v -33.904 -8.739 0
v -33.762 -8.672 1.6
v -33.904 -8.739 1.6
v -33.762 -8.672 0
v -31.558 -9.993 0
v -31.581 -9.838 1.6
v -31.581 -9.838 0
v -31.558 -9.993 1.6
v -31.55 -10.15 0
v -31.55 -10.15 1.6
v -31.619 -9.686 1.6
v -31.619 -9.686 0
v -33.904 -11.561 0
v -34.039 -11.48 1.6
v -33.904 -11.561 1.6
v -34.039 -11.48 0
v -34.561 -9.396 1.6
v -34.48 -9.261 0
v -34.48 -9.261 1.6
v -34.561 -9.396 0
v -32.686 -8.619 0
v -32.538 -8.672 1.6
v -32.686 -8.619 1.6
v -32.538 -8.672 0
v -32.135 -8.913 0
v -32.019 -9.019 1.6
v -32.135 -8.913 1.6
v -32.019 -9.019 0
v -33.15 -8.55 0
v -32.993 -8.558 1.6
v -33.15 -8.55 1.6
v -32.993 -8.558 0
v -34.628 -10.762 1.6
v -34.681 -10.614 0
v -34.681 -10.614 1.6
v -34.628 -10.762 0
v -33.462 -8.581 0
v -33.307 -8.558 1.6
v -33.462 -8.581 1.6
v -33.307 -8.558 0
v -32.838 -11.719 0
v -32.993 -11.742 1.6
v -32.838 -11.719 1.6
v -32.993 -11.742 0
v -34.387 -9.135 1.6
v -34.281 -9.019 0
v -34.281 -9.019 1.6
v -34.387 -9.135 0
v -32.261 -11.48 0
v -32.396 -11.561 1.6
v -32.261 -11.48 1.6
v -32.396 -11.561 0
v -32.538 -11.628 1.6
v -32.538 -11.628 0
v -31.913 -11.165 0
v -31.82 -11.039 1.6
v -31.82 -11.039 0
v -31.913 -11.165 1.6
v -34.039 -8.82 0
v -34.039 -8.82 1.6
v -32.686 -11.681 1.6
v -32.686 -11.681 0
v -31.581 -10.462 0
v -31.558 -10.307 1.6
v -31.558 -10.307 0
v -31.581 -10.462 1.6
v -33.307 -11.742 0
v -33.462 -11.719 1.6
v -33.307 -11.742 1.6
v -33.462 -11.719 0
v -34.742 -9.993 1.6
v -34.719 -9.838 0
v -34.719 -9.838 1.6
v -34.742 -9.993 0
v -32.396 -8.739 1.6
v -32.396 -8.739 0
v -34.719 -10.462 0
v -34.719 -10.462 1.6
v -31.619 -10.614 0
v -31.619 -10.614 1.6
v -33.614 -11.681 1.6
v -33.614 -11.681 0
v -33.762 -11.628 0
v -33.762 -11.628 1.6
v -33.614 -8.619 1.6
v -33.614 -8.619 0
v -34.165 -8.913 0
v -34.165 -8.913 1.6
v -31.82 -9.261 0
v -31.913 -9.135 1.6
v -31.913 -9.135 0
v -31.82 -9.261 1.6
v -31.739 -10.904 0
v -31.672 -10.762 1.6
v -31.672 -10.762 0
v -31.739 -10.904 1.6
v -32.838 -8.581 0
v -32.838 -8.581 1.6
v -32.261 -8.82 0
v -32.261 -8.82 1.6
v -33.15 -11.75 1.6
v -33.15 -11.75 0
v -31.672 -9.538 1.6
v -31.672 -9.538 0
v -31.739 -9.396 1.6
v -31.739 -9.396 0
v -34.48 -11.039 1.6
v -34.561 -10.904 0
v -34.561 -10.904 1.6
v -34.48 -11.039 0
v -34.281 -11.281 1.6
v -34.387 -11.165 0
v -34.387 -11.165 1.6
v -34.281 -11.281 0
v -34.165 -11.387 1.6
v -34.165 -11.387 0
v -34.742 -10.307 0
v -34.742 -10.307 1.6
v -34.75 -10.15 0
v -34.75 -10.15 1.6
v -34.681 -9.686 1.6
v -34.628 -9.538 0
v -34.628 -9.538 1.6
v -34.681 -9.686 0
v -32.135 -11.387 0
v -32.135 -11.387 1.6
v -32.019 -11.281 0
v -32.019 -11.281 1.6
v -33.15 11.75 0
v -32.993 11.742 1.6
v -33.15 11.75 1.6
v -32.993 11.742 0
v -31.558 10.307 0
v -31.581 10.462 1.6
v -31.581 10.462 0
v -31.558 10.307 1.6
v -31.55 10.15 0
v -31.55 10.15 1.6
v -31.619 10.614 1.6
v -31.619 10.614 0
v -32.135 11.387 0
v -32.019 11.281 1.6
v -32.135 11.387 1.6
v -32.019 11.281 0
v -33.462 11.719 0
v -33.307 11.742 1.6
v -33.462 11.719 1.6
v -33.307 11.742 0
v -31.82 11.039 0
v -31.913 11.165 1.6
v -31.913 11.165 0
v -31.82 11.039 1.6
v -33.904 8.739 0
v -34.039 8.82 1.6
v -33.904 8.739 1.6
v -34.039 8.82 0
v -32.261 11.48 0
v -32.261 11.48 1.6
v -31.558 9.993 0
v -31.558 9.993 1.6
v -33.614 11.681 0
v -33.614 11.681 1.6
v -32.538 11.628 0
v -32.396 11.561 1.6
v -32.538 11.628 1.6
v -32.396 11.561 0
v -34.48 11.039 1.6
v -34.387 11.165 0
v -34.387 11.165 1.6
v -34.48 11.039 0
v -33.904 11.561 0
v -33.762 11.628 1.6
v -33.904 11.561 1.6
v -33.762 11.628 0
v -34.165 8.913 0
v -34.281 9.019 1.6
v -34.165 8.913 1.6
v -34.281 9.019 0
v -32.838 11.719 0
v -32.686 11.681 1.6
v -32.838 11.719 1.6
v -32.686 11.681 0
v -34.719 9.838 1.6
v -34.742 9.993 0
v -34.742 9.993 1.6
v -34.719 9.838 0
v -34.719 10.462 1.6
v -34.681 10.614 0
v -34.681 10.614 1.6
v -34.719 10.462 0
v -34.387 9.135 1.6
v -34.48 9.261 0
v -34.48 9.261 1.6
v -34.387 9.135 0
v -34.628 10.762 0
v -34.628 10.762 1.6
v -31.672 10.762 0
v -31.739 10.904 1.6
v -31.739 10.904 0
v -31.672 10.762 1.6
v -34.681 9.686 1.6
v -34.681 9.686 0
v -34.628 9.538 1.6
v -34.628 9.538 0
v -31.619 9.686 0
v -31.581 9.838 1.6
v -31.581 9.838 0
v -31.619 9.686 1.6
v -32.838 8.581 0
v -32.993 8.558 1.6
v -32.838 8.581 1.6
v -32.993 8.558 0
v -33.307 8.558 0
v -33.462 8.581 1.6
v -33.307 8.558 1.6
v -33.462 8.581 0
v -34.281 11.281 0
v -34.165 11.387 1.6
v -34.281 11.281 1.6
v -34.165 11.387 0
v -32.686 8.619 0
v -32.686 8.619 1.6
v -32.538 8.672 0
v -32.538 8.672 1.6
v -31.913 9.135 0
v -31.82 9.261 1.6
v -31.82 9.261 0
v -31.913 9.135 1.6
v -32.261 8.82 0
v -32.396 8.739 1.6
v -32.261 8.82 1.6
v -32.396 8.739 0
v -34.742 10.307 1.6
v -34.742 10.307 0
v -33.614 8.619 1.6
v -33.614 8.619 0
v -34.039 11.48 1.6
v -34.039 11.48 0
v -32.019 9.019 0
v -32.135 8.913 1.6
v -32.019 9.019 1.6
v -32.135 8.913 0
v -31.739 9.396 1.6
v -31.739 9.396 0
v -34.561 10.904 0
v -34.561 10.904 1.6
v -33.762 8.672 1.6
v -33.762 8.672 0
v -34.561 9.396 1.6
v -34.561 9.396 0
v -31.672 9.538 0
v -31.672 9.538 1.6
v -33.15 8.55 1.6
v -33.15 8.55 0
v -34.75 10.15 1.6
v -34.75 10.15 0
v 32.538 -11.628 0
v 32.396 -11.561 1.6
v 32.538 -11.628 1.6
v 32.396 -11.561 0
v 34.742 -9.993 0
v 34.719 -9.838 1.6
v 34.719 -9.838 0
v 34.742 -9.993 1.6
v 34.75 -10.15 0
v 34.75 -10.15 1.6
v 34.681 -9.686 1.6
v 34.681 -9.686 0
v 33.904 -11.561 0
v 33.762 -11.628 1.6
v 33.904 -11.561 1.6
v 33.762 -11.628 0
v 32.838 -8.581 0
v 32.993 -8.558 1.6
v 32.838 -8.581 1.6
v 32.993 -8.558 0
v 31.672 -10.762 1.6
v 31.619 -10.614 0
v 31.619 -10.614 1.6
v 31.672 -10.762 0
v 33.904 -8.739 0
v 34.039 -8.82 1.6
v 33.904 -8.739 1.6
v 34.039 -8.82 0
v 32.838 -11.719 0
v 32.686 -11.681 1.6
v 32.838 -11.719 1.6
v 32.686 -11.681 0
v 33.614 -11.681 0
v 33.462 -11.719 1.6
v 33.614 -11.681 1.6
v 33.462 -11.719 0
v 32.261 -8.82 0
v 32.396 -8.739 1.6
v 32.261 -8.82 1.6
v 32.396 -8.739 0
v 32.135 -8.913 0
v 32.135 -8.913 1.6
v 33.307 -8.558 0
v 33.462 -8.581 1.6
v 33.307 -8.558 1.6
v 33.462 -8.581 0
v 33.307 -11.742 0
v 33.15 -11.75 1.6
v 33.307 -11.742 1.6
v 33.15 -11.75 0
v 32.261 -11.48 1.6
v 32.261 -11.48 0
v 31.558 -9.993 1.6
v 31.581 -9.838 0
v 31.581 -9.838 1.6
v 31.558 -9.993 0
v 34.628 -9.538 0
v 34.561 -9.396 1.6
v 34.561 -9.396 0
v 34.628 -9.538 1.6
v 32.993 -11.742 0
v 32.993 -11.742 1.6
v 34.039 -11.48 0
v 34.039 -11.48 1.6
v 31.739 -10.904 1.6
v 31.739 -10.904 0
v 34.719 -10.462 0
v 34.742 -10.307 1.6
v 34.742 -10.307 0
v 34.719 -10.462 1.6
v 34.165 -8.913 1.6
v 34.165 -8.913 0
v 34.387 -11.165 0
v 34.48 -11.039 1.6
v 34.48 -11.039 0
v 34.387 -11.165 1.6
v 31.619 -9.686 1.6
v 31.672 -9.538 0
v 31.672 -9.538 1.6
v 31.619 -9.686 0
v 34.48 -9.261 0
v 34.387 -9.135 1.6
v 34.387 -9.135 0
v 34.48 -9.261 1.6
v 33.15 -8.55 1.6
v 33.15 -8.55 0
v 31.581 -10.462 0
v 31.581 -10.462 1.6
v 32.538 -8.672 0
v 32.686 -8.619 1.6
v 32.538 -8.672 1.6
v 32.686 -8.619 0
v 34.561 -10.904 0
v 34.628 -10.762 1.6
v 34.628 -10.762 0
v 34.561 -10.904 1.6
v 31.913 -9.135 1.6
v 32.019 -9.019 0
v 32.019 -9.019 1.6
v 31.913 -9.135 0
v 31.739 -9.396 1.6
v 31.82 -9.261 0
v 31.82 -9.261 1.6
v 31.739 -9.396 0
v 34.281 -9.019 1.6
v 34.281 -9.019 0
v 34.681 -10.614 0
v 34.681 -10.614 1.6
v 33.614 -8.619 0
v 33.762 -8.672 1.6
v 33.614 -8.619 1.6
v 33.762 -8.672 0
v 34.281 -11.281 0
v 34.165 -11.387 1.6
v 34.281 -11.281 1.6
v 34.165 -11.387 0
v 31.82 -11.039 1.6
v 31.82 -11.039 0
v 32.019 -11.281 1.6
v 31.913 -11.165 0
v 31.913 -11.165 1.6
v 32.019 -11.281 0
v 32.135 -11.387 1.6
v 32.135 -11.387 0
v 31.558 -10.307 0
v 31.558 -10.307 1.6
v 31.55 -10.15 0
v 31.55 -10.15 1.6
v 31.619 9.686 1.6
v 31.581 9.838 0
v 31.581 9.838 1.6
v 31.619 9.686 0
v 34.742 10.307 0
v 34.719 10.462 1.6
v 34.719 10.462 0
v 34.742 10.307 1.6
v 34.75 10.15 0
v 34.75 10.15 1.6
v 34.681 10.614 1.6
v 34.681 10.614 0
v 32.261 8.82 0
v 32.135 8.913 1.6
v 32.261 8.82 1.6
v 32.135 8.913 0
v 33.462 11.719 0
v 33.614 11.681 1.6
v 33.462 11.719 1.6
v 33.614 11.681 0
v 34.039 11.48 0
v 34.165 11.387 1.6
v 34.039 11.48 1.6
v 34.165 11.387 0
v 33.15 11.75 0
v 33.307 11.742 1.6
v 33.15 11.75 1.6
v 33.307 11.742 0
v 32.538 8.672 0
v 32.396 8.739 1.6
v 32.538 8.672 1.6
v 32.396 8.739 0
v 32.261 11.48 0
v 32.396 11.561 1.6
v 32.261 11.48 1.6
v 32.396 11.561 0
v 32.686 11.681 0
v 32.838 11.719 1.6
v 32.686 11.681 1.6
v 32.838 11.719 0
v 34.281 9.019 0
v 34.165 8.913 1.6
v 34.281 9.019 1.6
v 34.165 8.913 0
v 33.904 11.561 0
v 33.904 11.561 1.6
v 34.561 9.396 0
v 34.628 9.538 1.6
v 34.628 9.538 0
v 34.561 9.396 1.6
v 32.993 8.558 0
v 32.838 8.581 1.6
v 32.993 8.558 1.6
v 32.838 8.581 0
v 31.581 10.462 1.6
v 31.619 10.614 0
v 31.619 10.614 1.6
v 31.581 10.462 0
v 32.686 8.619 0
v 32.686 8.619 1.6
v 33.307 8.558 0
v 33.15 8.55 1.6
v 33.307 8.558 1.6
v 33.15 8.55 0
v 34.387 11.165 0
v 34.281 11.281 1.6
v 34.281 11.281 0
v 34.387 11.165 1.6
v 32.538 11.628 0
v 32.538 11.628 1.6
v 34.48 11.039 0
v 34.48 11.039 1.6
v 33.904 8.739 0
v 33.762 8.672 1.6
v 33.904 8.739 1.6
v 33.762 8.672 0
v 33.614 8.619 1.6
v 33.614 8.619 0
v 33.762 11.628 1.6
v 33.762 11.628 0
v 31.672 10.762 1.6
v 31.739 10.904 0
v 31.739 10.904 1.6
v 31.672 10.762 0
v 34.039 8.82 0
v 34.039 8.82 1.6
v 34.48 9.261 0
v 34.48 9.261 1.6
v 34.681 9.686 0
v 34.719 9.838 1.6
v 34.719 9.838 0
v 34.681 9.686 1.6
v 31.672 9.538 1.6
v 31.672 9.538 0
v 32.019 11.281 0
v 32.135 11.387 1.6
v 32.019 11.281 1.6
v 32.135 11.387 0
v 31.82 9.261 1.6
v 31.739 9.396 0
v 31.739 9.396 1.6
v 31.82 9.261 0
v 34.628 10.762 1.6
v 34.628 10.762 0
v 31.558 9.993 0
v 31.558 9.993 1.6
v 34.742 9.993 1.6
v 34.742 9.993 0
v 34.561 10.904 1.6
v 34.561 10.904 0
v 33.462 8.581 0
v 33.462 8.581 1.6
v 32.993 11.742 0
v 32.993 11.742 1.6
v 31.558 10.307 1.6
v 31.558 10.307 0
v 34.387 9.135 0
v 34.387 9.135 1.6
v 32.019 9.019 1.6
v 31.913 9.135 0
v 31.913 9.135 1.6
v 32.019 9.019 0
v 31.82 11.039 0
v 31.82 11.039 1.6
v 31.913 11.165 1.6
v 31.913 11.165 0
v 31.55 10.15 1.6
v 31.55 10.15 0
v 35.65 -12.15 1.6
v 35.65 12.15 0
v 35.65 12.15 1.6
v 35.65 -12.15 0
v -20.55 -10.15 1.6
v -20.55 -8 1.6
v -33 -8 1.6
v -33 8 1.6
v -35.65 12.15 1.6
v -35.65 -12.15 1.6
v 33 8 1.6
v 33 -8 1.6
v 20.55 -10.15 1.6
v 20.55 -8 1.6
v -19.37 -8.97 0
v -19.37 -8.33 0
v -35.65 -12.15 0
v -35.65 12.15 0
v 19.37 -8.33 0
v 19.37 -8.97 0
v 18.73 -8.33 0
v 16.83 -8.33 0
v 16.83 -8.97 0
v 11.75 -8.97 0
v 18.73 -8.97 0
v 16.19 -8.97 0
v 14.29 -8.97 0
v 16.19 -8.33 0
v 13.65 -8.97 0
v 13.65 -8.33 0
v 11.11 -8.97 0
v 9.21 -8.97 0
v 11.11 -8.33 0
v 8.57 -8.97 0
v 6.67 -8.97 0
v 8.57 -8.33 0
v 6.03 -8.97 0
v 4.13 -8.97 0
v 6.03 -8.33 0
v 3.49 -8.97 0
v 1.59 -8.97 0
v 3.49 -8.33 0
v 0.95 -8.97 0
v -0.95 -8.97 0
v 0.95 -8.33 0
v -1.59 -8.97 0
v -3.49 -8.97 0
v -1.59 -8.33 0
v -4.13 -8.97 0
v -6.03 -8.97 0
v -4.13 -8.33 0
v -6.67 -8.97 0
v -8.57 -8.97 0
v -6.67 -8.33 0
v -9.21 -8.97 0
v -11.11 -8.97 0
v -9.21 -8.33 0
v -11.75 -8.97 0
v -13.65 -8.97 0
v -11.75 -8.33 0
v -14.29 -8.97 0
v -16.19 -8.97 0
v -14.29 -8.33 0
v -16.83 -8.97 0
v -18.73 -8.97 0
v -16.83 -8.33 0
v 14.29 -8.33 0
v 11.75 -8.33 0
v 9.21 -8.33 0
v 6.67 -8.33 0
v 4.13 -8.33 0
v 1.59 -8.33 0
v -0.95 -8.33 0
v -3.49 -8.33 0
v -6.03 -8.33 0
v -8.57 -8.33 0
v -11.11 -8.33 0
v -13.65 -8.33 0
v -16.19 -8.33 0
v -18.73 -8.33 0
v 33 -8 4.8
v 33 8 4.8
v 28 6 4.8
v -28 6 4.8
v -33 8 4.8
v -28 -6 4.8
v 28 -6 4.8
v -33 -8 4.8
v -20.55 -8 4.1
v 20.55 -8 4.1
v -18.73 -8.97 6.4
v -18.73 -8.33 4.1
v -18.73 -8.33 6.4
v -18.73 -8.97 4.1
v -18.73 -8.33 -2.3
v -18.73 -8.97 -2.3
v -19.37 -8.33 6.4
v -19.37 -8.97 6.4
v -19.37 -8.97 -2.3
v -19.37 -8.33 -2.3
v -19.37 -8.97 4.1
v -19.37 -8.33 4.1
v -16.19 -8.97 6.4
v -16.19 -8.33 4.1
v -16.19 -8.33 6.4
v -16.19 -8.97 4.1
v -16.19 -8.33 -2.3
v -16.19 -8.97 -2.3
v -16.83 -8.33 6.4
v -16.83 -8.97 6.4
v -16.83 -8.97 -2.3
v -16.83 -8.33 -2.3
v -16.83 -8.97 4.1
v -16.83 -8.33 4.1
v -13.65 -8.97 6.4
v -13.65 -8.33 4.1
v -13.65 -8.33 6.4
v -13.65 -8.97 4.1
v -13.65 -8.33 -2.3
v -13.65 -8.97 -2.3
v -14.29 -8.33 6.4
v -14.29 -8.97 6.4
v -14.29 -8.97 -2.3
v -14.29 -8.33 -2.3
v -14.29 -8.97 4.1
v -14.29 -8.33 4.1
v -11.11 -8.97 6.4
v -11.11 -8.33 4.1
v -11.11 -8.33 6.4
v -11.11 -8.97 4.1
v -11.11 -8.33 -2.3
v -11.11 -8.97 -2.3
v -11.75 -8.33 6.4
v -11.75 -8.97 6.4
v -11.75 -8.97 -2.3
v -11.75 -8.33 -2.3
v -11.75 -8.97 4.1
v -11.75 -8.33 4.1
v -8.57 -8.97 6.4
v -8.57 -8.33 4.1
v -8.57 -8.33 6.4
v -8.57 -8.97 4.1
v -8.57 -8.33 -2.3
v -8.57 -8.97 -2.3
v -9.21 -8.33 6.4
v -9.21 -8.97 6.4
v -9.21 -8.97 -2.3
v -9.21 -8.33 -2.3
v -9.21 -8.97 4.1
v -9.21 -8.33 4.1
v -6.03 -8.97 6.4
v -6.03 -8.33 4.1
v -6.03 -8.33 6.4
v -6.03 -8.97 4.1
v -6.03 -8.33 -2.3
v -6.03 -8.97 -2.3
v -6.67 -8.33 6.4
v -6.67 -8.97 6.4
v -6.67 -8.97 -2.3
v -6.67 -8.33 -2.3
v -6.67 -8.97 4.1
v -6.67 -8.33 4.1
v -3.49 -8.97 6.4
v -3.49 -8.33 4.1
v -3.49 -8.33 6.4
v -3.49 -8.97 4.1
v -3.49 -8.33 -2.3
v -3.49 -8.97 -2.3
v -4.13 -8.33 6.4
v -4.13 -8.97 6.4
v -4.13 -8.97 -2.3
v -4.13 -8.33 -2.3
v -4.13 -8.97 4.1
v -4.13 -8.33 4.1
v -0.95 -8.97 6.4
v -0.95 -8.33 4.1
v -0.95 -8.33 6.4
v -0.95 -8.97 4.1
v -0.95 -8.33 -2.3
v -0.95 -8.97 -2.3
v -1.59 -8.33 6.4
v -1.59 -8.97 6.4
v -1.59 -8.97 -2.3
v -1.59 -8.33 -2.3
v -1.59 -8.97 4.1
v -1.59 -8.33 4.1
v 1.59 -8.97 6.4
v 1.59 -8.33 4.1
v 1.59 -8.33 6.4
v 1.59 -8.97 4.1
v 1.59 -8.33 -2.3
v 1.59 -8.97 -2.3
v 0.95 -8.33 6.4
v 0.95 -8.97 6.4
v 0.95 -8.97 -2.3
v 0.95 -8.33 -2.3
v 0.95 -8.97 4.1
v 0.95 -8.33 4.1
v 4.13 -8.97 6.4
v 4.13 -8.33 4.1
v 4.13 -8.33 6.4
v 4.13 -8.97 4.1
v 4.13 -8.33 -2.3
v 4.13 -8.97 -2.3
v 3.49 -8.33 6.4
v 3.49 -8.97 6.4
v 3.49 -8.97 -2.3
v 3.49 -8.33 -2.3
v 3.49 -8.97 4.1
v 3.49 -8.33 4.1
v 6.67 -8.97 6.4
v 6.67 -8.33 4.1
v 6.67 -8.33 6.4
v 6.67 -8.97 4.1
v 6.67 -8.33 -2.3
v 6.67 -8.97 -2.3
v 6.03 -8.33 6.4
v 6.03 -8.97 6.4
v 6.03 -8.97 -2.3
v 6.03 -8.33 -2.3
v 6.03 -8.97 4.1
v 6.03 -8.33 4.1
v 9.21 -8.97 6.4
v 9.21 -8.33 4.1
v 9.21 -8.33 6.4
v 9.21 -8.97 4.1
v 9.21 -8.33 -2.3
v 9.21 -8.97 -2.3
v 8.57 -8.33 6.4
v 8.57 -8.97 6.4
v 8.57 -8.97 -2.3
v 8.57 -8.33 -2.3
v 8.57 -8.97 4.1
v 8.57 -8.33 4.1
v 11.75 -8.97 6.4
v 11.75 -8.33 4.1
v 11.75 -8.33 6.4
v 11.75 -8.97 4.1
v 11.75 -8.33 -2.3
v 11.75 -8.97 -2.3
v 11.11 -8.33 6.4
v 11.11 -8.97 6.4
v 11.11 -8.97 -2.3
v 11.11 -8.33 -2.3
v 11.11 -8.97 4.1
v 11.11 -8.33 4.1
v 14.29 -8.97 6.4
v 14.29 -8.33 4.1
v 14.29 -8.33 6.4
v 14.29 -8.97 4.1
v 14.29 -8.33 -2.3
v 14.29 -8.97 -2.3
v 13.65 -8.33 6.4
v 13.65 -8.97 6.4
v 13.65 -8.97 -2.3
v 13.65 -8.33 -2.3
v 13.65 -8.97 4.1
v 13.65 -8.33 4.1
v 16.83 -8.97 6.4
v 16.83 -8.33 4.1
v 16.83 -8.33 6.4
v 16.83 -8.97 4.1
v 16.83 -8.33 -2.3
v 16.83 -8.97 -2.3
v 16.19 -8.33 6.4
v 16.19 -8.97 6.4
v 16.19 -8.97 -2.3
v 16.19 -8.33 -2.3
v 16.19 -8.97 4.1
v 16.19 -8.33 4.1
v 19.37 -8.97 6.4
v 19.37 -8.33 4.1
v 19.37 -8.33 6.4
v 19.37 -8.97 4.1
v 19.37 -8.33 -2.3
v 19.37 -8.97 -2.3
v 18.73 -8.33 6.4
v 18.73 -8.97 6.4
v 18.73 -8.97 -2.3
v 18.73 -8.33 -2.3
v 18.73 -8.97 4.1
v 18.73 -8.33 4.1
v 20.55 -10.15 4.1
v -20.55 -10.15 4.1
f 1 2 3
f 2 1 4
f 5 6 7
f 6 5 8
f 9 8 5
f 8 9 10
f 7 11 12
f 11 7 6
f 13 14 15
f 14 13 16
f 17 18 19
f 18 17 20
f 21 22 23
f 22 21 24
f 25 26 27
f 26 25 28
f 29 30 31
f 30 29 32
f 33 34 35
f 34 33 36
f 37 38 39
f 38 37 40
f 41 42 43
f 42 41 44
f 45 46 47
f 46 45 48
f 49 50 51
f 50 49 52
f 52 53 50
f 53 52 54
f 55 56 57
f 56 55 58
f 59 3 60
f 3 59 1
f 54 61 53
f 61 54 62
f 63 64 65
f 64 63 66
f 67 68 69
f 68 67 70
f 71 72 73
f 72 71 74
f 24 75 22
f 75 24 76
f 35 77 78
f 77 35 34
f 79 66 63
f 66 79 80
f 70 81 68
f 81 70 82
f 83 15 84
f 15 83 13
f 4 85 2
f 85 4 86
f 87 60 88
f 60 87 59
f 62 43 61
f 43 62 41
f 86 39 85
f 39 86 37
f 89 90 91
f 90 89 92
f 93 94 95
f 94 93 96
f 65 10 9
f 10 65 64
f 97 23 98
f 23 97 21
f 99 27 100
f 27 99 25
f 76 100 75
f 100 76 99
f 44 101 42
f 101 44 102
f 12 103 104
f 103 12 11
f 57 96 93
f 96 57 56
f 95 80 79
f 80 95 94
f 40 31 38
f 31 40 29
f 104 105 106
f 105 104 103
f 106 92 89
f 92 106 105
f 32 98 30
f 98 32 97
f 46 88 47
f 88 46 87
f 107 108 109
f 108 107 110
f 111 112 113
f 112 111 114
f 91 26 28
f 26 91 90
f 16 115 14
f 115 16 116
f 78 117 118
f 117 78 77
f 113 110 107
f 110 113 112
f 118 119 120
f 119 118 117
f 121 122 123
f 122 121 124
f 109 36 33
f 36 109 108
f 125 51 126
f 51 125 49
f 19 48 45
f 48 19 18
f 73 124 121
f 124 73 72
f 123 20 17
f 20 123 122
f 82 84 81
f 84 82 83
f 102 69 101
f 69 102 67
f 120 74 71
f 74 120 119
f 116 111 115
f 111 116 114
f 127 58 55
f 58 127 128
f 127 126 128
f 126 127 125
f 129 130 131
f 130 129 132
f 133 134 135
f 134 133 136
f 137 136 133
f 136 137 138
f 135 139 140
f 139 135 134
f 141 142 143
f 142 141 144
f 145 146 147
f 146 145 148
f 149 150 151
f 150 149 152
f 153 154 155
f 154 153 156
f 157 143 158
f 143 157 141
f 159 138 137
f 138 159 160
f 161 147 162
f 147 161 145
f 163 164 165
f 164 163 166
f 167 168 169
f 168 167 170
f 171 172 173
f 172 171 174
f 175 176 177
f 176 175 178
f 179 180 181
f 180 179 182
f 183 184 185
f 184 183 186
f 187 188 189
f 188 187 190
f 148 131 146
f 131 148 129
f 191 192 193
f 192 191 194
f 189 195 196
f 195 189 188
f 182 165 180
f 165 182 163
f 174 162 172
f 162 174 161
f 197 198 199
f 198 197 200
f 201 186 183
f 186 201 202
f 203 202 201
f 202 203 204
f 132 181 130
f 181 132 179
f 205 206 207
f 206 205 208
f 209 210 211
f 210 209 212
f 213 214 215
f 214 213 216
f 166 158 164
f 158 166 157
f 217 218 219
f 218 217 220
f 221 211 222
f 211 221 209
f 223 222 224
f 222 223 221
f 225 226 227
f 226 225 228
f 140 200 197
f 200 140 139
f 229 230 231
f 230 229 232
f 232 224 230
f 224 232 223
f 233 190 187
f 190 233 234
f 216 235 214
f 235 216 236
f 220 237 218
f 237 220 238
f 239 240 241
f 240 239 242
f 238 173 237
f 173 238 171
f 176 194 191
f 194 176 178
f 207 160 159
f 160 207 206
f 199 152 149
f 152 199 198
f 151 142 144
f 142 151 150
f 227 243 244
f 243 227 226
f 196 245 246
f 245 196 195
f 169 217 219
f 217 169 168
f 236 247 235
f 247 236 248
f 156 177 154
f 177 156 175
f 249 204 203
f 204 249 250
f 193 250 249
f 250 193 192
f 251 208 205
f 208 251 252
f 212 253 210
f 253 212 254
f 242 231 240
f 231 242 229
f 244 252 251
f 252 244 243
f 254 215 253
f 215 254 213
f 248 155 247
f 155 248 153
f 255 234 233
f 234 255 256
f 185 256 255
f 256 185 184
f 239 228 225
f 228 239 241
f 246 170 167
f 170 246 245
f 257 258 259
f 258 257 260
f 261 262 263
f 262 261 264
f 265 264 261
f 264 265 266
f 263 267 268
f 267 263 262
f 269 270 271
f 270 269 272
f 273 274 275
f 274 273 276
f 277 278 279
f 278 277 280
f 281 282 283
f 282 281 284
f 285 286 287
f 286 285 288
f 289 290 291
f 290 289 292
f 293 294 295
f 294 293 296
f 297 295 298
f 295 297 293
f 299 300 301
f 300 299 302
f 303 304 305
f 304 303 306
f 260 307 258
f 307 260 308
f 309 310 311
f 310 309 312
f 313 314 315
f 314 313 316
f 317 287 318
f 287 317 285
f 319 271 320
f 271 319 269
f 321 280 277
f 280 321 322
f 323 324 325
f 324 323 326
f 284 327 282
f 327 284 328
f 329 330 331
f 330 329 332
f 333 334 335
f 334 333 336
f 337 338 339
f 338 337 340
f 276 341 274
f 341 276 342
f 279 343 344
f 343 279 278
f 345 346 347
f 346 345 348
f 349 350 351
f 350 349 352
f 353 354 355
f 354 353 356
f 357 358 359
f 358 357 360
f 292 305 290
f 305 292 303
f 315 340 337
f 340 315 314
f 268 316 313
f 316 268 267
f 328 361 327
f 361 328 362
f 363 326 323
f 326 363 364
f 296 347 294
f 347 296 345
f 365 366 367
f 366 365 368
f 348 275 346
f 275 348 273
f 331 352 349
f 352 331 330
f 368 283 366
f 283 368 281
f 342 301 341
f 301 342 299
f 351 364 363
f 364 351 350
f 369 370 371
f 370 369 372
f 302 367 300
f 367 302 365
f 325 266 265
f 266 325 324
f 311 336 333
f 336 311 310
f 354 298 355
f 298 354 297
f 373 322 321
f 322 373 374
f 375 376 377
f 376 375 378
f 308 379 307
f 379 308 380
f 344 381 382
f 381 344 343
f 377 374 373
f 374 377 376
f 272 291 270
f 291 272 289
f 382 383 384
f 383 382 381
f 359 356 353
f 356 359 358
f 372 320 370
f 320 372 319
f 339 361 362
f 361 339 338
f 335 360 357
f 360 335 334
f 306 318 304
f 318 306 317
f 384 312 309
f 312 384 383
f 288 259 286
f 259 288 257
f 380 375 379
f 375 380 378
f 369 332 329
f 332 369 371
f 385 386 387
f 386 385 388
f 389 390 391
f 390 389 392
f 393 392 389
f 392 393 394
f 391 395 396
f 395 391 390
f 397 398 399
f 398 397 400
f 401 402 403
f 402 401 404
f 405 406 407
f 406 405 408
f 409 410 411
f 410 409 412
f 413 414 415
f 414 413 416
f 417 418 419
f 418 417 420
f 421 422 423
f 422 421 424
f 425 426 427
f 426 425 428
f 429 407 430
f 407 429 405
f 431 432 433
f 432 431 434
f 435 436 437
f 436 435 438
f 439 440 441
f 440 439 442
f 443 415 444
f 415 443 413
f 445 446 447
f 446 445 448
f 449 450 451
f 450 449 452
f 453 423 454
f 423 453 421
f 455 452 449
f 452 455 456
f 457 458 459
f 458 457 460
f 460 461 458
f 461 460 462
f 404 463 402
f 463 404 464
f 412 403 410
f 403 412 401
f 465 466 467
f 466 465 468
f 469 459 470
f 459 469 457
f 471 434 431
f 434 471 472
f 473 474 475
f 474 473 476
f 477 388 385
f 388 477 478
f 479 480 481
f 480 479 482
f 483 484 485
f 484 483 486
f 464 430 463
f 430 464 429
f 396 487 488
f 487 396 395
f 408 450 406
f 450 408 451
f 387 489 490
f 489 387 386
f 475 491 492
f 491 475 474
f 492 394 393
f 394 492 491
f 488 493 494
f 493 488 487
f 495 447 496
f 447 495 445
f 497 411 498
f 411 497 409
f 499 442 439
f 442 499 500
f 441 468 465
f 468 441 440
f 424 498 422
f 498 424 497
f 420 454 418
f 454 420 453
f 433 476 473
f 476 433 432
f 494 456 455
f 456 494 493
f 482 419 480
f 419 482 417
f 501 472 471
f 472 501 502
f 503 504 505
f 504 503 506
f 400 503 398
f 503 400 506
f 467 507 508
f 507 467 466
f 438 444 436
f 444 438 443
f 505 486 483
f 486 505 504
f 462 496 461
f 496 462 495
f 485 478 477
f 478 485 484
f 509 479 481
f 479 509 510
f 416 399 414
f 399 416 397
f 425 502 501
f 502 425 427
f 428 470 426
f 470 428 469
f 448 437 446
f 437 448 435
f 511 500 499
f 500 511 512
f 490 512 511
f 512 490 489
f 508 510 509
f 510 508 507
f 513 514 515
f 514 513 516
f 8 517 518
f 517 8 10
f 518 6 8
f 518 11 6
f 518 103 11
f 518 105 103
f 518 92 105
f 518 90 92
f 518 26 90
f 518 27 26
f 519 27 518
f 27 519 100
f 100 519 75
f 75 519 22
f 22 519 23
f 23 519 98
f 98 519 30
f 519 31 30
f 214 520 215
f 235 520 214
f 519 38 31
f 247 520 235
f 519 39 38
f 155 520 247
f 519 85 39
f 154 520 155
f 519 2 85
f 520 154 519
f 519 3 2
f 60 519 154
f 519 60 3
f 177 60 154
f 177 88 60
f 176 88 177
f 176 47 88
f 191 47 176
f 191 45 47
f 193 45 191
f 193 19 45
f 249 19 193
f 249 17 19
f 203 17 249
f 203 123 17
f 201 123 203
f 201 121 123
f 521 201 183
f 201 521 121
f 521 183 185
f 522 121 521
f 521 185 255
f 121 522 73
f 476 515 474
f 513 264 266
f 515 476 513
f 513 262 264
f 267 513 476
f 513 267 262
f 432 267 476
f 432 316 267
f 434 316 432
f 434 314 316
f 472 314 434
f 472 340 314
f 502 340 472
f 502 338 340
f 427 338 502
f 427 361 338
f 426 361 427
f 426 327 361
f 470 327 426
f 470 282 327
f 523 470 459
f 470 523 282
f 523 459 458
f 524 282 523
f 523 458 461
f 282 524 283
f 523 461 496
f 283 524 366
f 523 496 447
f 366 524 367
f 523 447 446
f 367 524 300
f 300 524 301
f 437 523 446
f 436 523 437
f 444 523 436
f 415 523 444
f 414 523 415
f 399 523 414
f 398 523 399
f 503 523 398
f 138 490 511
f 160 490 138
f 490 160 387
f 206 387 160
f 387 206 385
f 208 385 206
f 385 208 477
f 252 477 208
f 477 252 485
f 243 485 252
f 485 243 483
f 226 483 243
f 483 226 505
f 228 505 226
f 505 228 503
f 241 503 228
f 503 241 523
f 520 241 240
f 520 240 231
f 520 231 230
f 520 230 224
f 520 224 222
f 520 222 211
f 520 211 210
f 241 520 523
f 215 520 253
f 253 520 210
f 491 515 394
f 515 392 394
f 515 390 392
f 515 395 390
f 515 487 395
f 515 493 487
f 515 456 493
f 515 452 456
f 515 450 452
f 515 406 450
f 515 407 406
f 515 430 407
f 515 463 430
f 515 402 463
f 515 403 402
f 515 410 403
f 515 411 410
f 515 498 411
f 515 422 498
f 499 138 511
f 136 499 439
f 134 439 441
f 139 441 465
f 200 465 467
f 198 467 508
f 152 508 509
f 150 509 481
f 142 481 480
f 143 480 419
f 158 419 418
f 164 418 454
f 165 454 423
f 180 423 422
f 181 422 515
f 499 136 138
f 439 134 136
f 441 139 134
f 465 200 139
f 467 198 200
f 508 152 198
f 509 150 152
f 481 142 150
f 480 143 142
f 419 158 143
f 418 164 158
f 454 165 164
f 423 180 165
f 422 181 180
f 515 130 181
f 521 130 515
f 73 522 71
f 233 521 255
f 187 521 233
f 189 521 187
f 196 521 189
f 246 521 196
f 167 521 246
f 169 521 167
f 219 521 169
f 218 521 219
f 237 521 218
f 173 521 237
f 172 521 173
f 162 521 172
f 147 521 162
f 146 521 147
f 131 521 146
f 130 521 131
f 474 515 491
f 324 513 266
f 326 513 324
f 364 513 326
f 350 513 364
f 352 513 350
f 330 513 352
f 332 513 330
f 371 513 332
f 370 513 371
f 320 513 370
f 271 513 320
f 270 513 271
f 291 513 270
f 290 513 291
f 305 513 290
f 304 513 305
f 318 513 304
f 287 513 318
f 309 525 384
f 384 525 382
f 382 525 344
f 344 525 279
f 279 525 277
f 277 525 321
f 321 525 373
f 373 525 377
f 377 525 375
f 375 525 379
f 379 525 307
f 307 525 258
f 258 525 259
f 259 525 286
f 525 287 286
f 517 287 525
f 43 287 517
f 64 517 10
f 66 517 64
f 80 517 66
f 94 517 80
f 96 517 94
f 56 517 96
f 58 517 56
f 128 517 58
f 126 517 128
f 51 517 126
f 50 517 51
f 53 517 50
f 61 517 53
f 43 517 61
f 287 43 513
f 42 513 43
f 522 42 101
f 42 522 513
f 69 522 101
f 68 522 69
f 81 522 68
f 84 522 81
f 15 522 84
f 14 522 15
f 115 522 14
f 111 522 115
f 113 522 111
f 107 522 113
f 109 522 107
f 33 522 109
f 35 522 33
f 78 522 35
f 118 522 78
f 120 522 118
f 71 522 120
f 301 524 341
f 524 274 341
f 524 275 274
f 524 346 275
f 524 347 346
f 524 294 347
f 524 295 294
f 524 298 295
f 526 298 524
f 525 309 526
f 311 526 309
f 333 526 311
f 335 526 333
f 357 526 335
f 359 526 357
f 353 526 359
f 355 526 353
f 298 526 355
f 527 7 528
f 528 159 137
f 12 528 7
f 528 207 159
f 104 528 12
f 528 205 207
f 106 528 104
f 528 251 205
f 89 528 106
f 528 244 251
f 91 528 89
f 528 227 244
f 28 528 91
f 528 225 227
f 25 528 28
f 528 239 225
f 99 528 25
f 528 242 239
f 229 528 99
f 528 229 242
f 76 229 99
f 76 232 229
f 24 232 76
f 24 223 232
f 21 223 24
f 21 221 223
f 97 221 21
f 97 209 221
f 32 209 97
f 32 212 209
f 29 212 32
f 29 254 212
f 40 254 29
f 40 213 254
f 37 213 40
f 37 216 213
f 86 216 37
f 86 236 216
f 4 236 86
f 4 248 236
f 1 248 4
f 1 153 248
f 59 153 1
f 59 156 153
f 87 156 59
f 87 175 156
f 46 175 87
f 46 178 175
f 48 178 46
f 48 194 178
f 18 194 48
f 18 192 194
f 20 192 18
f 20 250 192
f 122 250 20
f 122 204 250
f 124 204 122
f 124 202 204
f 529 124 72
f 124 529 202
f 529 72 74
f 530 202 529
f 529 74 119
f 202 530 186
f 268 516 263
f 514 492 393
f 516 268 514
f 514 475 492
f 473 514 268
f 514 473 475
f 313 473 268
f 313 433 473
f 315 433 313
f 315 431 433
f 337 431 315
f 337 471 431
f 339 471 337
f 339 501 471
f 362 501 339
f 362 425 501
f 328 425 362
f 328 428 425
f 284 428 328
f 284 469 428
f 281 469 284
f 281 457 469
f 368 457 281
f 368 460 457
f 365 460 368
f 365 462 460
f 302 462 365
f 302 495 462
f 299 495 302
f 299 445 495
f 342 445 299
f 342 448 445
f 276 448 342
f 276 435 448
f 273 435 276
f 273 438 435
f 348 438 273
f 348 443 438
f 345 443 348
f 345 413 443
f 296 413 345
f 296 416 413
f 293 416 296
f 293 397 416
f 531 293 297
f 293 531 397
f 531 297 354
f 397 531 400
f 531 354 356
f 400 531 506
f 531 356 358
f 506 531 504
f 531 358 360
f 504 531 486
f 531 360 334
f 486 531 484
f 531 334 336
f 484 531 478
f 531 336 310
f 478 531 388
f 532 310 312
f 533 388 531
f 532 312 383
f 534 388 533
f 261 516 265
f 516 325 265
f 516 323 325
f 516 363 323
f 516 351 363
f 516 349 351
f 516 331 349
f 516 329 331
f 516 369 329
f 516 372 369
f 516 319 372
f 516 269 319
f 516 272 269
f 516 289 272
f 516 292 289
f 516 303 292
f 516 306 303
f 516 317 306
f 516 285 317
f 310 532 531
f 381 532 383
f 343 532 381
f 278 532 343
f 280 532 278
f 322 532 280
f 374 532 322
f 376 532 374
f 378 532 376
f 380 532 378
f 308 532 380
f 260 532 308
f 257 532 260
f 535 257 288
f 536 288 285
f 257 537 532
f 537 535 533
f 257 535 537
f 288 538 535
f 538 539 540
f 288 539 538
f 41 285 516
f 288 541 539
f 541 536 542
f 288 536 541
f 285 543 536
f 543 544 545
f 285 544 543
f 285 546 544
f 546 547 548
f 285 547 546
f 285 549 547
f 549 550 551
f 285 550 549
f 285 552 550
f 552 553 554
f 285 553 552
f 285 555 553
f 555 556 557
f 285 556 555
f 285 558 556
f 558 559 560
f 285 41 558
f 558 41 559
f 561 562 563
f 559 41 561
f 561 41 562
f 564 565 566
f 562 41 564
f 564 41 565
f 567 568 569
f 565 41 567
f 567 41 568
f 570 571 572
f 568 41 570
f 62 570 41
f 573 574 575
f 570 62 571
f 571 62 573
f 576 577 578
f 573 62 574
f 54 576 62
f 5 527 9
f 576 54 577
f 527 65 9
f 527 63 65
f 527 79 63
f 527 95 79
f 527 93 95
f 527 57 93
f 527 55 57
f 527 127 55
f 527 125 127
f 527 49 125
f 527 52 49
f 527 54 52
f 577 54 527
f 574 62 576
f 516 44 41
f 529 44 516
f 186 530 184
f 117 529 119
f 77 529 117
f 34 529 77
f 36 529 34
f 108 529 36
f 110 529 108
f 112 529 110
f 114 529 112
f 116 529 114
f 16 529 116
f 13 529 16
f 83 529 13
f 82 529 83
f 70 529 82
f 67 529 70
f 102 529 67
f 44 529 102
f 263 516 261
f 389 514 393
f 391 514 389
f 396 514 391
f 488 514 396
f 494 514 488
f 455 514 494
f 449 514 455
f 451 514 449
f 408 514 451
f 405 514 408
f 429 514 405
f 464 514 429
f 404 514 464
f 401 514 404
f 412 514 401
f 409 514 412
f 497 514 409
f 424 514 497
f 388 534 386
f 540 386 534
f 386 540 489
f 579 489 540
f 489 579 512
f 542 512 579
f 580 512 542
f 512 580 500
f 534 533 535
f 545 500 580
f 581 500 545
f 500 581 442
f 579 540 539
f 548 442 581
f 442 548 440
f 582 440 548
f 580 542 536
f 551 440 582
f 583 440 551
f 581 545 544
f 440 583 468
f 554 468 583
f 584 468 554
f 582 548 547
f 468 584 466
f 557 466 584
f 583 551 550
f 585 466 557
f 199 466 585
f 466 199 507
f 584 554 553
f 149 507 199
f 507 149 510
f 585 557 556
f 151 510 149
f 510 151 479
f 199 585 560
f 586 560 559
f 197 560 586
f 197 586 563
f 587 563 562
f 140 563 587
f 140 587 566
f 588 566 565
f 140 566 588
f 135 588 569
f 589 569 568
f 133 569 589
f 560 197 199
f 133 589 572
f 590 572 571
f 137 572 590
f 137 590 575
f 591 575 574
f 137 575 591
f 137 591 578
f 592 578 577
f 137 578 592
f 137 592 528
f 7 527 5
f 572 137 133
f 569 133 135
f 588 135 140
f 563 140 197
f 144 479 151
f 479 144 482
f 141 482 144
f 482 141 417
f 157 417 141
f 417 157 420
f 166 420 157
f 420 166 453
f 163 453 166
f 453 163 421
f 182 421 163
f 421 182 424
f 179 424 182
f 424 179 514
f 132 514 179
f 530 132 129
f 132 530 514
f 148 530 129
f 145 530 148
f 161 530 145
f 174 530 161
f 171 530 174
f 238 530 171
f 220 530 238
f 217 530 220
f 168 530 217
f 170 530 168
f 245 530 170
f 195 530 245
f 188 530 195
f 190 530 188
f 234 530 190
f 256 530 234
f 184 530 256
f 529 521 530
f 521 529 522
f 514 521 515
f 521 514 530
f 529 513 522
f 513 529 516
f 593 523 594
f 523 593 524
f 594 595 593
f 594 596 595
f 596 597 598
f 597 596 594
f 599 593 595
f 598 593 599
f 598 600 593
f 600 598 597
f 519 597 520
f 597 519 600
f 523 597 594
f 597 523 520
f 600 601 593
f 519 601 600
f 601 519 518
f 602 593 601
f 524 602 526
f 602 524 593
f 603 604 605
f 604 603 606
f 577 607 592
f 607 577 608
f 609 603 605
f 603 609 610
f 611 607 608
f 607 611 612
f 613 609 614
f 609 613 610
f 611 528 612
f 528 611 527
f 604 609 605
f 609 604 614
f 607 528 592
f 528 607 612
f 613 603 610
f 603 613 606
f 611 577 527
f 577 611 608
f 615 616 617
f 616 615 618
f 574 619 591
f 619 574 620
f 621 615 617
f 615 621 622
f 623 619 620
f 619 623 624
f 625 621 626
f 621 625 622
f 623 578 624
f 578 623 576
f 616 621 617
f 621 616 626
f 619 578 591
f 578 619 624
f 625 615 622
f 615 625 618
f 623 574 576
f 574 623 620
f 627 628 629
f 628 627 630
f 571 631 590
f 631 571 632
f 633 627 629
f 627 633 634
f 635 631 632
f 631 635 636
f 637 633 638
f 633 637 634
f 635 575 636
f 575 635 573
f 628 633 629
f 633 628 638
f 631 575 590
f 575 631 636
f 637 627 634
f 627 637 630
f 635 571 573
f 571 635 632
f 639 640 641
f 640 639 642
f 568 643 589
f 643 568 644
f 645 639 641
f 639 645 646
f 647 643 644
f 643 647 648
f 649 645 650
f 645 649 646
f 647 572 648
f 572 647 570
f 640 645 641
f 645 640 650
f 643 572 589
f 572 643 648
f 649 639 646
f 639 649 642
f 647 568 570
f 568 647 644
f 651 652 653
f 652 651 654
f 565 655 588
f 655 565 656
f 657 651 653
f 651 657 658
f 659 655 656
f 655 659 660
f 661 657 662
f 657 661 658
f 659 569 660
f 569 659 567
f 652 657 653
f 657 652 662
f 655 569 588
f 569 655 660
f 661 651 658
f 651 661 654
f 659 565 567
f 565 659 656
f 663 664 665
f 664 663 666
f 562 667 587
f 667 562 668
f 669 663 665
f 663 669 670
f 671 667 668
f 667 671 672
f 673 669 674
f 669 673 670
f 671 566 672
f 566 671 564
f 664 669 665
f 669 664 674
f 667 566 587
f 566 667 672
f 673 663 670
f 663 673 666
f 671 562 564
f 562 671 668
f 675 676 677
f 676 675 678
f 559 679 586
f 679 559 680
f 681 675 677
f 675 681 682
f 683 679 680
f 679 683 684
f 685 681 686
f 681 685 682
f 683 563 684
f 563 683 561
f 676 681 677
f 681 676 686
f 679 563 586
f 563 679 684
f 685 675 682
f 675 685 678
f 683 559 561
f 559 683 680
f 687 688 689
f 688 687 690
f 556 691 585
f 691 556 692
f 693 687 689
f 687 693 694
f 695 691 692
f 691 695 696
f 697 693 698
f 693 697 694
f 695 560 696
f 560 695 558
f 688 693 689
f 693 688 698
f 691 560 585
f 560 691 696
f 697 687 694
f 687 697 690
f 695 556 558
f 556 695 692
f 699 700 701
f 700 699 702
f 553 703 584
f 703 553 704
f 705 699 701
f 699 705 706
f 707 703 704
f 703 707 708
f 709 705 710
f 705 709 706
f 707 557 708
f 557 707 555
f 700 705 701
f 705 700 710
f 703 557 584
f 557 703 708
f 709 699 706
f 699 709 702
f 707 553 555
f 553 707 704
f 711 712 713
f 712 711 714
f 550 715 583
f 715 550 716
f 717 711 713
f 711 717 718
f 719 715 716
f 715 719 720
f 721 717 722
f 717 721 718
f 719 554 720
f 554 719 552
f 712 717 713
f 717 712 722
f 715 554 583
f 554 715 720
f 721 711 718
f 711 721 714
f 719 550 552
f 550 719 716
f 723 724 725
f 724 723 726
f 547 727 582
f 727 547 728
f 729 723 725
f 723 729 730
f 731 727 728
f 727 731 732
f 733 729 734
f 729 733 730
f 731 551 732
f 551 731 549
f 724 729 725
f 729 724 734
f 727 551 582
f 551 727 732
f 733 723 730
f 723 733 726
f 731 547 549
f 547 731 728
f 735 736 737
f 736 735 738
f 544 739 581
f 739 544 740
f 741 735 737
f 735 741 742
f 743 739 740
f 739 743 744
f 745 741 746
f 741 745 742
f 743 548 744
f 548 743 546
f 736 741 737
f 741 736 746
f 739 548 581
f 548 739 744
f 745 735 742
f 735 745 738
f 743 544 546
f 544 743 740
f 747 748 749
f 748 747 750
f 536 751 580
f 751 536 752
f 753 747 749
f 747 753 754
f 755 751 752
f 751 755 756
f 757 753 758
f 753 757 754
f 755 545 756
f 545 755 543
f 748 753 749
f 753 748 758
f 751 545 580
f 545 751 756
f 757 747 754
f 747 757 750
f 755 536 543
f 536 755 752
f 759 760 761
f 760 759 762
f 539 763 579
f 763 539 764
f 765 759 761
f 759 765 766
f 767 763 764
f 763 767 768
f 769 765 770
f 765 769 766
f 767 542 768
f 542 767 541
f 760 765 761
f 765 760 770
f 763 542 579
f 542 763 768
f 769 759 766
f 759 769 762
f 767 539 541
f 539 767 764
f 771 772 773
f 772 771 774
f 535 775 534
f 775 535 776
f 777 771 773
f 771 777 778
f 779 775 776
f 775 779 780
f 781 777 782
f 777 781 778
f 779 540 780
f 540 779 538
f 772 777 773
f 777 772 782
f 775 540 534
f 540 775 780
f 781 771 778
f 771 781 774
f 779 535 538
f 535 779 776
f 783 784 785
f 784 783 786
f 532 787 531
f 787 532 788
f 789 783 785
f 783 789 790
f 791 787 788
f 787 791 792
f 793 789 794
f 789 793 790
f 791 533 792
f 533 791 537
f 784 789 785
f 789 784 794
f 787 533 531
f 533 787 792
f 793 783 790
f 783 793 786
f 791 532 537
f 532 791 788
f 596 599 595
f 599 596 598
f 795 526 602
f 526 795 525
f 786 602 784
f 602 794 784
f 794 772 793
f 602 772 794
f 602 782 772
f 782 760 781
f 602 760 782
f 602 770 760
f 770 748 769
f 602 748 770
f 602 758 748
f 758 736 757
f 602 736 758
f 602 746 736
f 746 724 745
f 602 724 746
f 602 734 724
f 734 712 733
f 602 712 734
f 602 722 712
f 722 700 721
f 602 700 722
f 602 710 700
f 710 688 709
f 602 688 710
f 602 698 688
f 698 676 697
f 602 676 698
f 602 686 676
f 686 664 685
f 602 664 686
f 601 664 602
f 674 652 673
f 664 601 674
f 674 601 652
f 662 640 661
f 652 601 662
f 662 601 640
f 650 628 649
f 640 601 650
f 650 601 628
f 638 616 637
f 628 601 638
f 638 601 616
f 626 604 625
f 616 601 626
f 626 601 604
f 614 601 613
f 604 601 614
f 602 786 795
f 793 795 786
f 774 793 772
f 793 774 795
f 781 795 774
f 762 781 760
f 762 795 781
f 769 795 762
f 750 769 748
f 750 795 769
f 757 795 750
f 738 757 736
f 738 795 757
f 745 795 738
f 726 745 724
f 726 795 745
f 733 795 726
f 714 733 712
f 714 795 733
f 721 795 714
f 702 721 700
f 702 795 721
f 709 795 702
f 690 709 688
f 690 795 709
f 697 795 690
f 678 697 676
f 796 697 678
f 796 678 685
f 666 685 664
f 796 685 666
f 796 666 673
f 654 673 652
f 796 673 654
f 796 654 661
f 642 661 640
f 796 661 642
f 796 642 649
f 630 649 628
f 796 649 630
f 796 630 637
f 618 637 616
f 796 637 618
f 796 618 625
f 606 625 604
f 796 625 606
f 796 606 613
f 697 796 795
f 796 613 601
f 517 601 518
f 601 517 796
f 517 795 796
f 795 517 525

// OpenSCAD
$fn = 64;

// LCD 1602A display module (simplified) - overall PCB: 71.3mm x 24.3mm
// Single connected solid (unioned), with bezel, recessed window, header, and 4 mounting holes.

module lcd1602a(
    pcb_x = 71.3,
    pcb_y = 24.3,
    pcb_t = 1.6,

    // Bezel (black frame) on top of PCB
    bezel_x = 66.0,
    bezel_y = 16.0,
    bezel_t = 3.2,

    // Display window recess in bezel
    window_x = 56.0,
    window_y = 12.0,
    window_depth = 1.2,

    // Glass inset (fills the recess)
    glass_t = 1.2,

    // Mounting holes (typical 1602A has 4 holes)
    hole_d = 3.2,
    hole_edge_x = 2.5,   // distance from PCB edge to hole center (X)
    hole_edge_y = 2.0,   // distance from PCB edge to hole center (Y)

    // 16-pin header (1x16, 2.54mm pitch)
    header_pins = 16,
    header_pitch = 2.54,
    header_pin_w = 0.64,
    header_pin_h = 6.0,
    header_body_h = 2.5,
    header_body_w = 3.0,
    header_inset_from_edge = 3.5, // from PCB edge to header centerline
    overlap = 0.2                 // small overlap to guarantee connectivity
) {

    // Derived
    header_len = (header_pins - 1) * header_pitch;
    header_x = header_len + header_body_w; // plastic body length along X
    header_y = header_body_w;
    header_z = header_body_h;

    // Place header along one long edge (negative Y), sitting on PCB top
    header_center_y = -pcb_y/2 + header_inset_from_edge;
    header_body_z0 = pcb_t - overlap; // overlap into PCB to ensure one connected solid

    // Hole centers
    hx = pcb_x/2 - hole_edge_x;
    hy = pcb_y/2 - hole_edge_y;

    union() {

        // PCB with mounting holes
        difference() {
            translate([-pcb_x/2, -pcb_y/2, 0])
                cube([pcb_x, pcb_y, pcb_t], center=false);

            for (sx = [-1, 1], sy = [-1, 1]) {
                translate([sx*hx, sy*hy, -1])
                    cylinder(d=hole_d, h=pcb_t + 2, center=false);
            }
        }

        // Bezel (top) with window recess
        translate([0, 0, pcb_t - overlap])
        difference() {
            translate([-bezel_x/2, -bezel_y/2, 0])
                cube([bezel_x, bezel_y, bezel_t + overlap], center=false);

            // Window recess cut from top face down by window_depth
            translate([-window_x/2, -window_y/2, bezel_t - window_depth])
                cube([window_x, window_y, window_depth + 0.3], center=false);
        }

        // Glass inset (fills recess) - overlaps slightly into bezel for connectivity
        translate([0, 0, pcb_t + bezel_t - window_depth - overlap])
            translate([-window_x/2, -window_y/2, 0])
                cube([window_x, window_y, glass_t + overlap], center=false);

        // Header plastic body (on top of PCB, near one edge)
        translate([-header_x/2, header_center_y - header_y/2, header_body_z0])
            cube([header_x, header_y, header_z + overlap], center=false);

        // Pins (extend downward through/under PCB; overlap into header body)
        for (i = [0:header_pins-1]) {
            x = -header_len/2 + i*header_pitch;

            // Pin starts slightly inside header body and extends below PCB
            pin_z0 = header_body_z0 + header_z - overlap; // inside header body
            pin_h_total = header_pin_h + header_body_h + overlap;

            translate([x - header_pin_w/2,
                       header_center_y - header_pin_w/2,
                       pin_z0 - header_pin_h])
                cube([header_pin_w, header_pin_w, pin_h_total], center=false);
        }
    }
}

lcd1602a();
